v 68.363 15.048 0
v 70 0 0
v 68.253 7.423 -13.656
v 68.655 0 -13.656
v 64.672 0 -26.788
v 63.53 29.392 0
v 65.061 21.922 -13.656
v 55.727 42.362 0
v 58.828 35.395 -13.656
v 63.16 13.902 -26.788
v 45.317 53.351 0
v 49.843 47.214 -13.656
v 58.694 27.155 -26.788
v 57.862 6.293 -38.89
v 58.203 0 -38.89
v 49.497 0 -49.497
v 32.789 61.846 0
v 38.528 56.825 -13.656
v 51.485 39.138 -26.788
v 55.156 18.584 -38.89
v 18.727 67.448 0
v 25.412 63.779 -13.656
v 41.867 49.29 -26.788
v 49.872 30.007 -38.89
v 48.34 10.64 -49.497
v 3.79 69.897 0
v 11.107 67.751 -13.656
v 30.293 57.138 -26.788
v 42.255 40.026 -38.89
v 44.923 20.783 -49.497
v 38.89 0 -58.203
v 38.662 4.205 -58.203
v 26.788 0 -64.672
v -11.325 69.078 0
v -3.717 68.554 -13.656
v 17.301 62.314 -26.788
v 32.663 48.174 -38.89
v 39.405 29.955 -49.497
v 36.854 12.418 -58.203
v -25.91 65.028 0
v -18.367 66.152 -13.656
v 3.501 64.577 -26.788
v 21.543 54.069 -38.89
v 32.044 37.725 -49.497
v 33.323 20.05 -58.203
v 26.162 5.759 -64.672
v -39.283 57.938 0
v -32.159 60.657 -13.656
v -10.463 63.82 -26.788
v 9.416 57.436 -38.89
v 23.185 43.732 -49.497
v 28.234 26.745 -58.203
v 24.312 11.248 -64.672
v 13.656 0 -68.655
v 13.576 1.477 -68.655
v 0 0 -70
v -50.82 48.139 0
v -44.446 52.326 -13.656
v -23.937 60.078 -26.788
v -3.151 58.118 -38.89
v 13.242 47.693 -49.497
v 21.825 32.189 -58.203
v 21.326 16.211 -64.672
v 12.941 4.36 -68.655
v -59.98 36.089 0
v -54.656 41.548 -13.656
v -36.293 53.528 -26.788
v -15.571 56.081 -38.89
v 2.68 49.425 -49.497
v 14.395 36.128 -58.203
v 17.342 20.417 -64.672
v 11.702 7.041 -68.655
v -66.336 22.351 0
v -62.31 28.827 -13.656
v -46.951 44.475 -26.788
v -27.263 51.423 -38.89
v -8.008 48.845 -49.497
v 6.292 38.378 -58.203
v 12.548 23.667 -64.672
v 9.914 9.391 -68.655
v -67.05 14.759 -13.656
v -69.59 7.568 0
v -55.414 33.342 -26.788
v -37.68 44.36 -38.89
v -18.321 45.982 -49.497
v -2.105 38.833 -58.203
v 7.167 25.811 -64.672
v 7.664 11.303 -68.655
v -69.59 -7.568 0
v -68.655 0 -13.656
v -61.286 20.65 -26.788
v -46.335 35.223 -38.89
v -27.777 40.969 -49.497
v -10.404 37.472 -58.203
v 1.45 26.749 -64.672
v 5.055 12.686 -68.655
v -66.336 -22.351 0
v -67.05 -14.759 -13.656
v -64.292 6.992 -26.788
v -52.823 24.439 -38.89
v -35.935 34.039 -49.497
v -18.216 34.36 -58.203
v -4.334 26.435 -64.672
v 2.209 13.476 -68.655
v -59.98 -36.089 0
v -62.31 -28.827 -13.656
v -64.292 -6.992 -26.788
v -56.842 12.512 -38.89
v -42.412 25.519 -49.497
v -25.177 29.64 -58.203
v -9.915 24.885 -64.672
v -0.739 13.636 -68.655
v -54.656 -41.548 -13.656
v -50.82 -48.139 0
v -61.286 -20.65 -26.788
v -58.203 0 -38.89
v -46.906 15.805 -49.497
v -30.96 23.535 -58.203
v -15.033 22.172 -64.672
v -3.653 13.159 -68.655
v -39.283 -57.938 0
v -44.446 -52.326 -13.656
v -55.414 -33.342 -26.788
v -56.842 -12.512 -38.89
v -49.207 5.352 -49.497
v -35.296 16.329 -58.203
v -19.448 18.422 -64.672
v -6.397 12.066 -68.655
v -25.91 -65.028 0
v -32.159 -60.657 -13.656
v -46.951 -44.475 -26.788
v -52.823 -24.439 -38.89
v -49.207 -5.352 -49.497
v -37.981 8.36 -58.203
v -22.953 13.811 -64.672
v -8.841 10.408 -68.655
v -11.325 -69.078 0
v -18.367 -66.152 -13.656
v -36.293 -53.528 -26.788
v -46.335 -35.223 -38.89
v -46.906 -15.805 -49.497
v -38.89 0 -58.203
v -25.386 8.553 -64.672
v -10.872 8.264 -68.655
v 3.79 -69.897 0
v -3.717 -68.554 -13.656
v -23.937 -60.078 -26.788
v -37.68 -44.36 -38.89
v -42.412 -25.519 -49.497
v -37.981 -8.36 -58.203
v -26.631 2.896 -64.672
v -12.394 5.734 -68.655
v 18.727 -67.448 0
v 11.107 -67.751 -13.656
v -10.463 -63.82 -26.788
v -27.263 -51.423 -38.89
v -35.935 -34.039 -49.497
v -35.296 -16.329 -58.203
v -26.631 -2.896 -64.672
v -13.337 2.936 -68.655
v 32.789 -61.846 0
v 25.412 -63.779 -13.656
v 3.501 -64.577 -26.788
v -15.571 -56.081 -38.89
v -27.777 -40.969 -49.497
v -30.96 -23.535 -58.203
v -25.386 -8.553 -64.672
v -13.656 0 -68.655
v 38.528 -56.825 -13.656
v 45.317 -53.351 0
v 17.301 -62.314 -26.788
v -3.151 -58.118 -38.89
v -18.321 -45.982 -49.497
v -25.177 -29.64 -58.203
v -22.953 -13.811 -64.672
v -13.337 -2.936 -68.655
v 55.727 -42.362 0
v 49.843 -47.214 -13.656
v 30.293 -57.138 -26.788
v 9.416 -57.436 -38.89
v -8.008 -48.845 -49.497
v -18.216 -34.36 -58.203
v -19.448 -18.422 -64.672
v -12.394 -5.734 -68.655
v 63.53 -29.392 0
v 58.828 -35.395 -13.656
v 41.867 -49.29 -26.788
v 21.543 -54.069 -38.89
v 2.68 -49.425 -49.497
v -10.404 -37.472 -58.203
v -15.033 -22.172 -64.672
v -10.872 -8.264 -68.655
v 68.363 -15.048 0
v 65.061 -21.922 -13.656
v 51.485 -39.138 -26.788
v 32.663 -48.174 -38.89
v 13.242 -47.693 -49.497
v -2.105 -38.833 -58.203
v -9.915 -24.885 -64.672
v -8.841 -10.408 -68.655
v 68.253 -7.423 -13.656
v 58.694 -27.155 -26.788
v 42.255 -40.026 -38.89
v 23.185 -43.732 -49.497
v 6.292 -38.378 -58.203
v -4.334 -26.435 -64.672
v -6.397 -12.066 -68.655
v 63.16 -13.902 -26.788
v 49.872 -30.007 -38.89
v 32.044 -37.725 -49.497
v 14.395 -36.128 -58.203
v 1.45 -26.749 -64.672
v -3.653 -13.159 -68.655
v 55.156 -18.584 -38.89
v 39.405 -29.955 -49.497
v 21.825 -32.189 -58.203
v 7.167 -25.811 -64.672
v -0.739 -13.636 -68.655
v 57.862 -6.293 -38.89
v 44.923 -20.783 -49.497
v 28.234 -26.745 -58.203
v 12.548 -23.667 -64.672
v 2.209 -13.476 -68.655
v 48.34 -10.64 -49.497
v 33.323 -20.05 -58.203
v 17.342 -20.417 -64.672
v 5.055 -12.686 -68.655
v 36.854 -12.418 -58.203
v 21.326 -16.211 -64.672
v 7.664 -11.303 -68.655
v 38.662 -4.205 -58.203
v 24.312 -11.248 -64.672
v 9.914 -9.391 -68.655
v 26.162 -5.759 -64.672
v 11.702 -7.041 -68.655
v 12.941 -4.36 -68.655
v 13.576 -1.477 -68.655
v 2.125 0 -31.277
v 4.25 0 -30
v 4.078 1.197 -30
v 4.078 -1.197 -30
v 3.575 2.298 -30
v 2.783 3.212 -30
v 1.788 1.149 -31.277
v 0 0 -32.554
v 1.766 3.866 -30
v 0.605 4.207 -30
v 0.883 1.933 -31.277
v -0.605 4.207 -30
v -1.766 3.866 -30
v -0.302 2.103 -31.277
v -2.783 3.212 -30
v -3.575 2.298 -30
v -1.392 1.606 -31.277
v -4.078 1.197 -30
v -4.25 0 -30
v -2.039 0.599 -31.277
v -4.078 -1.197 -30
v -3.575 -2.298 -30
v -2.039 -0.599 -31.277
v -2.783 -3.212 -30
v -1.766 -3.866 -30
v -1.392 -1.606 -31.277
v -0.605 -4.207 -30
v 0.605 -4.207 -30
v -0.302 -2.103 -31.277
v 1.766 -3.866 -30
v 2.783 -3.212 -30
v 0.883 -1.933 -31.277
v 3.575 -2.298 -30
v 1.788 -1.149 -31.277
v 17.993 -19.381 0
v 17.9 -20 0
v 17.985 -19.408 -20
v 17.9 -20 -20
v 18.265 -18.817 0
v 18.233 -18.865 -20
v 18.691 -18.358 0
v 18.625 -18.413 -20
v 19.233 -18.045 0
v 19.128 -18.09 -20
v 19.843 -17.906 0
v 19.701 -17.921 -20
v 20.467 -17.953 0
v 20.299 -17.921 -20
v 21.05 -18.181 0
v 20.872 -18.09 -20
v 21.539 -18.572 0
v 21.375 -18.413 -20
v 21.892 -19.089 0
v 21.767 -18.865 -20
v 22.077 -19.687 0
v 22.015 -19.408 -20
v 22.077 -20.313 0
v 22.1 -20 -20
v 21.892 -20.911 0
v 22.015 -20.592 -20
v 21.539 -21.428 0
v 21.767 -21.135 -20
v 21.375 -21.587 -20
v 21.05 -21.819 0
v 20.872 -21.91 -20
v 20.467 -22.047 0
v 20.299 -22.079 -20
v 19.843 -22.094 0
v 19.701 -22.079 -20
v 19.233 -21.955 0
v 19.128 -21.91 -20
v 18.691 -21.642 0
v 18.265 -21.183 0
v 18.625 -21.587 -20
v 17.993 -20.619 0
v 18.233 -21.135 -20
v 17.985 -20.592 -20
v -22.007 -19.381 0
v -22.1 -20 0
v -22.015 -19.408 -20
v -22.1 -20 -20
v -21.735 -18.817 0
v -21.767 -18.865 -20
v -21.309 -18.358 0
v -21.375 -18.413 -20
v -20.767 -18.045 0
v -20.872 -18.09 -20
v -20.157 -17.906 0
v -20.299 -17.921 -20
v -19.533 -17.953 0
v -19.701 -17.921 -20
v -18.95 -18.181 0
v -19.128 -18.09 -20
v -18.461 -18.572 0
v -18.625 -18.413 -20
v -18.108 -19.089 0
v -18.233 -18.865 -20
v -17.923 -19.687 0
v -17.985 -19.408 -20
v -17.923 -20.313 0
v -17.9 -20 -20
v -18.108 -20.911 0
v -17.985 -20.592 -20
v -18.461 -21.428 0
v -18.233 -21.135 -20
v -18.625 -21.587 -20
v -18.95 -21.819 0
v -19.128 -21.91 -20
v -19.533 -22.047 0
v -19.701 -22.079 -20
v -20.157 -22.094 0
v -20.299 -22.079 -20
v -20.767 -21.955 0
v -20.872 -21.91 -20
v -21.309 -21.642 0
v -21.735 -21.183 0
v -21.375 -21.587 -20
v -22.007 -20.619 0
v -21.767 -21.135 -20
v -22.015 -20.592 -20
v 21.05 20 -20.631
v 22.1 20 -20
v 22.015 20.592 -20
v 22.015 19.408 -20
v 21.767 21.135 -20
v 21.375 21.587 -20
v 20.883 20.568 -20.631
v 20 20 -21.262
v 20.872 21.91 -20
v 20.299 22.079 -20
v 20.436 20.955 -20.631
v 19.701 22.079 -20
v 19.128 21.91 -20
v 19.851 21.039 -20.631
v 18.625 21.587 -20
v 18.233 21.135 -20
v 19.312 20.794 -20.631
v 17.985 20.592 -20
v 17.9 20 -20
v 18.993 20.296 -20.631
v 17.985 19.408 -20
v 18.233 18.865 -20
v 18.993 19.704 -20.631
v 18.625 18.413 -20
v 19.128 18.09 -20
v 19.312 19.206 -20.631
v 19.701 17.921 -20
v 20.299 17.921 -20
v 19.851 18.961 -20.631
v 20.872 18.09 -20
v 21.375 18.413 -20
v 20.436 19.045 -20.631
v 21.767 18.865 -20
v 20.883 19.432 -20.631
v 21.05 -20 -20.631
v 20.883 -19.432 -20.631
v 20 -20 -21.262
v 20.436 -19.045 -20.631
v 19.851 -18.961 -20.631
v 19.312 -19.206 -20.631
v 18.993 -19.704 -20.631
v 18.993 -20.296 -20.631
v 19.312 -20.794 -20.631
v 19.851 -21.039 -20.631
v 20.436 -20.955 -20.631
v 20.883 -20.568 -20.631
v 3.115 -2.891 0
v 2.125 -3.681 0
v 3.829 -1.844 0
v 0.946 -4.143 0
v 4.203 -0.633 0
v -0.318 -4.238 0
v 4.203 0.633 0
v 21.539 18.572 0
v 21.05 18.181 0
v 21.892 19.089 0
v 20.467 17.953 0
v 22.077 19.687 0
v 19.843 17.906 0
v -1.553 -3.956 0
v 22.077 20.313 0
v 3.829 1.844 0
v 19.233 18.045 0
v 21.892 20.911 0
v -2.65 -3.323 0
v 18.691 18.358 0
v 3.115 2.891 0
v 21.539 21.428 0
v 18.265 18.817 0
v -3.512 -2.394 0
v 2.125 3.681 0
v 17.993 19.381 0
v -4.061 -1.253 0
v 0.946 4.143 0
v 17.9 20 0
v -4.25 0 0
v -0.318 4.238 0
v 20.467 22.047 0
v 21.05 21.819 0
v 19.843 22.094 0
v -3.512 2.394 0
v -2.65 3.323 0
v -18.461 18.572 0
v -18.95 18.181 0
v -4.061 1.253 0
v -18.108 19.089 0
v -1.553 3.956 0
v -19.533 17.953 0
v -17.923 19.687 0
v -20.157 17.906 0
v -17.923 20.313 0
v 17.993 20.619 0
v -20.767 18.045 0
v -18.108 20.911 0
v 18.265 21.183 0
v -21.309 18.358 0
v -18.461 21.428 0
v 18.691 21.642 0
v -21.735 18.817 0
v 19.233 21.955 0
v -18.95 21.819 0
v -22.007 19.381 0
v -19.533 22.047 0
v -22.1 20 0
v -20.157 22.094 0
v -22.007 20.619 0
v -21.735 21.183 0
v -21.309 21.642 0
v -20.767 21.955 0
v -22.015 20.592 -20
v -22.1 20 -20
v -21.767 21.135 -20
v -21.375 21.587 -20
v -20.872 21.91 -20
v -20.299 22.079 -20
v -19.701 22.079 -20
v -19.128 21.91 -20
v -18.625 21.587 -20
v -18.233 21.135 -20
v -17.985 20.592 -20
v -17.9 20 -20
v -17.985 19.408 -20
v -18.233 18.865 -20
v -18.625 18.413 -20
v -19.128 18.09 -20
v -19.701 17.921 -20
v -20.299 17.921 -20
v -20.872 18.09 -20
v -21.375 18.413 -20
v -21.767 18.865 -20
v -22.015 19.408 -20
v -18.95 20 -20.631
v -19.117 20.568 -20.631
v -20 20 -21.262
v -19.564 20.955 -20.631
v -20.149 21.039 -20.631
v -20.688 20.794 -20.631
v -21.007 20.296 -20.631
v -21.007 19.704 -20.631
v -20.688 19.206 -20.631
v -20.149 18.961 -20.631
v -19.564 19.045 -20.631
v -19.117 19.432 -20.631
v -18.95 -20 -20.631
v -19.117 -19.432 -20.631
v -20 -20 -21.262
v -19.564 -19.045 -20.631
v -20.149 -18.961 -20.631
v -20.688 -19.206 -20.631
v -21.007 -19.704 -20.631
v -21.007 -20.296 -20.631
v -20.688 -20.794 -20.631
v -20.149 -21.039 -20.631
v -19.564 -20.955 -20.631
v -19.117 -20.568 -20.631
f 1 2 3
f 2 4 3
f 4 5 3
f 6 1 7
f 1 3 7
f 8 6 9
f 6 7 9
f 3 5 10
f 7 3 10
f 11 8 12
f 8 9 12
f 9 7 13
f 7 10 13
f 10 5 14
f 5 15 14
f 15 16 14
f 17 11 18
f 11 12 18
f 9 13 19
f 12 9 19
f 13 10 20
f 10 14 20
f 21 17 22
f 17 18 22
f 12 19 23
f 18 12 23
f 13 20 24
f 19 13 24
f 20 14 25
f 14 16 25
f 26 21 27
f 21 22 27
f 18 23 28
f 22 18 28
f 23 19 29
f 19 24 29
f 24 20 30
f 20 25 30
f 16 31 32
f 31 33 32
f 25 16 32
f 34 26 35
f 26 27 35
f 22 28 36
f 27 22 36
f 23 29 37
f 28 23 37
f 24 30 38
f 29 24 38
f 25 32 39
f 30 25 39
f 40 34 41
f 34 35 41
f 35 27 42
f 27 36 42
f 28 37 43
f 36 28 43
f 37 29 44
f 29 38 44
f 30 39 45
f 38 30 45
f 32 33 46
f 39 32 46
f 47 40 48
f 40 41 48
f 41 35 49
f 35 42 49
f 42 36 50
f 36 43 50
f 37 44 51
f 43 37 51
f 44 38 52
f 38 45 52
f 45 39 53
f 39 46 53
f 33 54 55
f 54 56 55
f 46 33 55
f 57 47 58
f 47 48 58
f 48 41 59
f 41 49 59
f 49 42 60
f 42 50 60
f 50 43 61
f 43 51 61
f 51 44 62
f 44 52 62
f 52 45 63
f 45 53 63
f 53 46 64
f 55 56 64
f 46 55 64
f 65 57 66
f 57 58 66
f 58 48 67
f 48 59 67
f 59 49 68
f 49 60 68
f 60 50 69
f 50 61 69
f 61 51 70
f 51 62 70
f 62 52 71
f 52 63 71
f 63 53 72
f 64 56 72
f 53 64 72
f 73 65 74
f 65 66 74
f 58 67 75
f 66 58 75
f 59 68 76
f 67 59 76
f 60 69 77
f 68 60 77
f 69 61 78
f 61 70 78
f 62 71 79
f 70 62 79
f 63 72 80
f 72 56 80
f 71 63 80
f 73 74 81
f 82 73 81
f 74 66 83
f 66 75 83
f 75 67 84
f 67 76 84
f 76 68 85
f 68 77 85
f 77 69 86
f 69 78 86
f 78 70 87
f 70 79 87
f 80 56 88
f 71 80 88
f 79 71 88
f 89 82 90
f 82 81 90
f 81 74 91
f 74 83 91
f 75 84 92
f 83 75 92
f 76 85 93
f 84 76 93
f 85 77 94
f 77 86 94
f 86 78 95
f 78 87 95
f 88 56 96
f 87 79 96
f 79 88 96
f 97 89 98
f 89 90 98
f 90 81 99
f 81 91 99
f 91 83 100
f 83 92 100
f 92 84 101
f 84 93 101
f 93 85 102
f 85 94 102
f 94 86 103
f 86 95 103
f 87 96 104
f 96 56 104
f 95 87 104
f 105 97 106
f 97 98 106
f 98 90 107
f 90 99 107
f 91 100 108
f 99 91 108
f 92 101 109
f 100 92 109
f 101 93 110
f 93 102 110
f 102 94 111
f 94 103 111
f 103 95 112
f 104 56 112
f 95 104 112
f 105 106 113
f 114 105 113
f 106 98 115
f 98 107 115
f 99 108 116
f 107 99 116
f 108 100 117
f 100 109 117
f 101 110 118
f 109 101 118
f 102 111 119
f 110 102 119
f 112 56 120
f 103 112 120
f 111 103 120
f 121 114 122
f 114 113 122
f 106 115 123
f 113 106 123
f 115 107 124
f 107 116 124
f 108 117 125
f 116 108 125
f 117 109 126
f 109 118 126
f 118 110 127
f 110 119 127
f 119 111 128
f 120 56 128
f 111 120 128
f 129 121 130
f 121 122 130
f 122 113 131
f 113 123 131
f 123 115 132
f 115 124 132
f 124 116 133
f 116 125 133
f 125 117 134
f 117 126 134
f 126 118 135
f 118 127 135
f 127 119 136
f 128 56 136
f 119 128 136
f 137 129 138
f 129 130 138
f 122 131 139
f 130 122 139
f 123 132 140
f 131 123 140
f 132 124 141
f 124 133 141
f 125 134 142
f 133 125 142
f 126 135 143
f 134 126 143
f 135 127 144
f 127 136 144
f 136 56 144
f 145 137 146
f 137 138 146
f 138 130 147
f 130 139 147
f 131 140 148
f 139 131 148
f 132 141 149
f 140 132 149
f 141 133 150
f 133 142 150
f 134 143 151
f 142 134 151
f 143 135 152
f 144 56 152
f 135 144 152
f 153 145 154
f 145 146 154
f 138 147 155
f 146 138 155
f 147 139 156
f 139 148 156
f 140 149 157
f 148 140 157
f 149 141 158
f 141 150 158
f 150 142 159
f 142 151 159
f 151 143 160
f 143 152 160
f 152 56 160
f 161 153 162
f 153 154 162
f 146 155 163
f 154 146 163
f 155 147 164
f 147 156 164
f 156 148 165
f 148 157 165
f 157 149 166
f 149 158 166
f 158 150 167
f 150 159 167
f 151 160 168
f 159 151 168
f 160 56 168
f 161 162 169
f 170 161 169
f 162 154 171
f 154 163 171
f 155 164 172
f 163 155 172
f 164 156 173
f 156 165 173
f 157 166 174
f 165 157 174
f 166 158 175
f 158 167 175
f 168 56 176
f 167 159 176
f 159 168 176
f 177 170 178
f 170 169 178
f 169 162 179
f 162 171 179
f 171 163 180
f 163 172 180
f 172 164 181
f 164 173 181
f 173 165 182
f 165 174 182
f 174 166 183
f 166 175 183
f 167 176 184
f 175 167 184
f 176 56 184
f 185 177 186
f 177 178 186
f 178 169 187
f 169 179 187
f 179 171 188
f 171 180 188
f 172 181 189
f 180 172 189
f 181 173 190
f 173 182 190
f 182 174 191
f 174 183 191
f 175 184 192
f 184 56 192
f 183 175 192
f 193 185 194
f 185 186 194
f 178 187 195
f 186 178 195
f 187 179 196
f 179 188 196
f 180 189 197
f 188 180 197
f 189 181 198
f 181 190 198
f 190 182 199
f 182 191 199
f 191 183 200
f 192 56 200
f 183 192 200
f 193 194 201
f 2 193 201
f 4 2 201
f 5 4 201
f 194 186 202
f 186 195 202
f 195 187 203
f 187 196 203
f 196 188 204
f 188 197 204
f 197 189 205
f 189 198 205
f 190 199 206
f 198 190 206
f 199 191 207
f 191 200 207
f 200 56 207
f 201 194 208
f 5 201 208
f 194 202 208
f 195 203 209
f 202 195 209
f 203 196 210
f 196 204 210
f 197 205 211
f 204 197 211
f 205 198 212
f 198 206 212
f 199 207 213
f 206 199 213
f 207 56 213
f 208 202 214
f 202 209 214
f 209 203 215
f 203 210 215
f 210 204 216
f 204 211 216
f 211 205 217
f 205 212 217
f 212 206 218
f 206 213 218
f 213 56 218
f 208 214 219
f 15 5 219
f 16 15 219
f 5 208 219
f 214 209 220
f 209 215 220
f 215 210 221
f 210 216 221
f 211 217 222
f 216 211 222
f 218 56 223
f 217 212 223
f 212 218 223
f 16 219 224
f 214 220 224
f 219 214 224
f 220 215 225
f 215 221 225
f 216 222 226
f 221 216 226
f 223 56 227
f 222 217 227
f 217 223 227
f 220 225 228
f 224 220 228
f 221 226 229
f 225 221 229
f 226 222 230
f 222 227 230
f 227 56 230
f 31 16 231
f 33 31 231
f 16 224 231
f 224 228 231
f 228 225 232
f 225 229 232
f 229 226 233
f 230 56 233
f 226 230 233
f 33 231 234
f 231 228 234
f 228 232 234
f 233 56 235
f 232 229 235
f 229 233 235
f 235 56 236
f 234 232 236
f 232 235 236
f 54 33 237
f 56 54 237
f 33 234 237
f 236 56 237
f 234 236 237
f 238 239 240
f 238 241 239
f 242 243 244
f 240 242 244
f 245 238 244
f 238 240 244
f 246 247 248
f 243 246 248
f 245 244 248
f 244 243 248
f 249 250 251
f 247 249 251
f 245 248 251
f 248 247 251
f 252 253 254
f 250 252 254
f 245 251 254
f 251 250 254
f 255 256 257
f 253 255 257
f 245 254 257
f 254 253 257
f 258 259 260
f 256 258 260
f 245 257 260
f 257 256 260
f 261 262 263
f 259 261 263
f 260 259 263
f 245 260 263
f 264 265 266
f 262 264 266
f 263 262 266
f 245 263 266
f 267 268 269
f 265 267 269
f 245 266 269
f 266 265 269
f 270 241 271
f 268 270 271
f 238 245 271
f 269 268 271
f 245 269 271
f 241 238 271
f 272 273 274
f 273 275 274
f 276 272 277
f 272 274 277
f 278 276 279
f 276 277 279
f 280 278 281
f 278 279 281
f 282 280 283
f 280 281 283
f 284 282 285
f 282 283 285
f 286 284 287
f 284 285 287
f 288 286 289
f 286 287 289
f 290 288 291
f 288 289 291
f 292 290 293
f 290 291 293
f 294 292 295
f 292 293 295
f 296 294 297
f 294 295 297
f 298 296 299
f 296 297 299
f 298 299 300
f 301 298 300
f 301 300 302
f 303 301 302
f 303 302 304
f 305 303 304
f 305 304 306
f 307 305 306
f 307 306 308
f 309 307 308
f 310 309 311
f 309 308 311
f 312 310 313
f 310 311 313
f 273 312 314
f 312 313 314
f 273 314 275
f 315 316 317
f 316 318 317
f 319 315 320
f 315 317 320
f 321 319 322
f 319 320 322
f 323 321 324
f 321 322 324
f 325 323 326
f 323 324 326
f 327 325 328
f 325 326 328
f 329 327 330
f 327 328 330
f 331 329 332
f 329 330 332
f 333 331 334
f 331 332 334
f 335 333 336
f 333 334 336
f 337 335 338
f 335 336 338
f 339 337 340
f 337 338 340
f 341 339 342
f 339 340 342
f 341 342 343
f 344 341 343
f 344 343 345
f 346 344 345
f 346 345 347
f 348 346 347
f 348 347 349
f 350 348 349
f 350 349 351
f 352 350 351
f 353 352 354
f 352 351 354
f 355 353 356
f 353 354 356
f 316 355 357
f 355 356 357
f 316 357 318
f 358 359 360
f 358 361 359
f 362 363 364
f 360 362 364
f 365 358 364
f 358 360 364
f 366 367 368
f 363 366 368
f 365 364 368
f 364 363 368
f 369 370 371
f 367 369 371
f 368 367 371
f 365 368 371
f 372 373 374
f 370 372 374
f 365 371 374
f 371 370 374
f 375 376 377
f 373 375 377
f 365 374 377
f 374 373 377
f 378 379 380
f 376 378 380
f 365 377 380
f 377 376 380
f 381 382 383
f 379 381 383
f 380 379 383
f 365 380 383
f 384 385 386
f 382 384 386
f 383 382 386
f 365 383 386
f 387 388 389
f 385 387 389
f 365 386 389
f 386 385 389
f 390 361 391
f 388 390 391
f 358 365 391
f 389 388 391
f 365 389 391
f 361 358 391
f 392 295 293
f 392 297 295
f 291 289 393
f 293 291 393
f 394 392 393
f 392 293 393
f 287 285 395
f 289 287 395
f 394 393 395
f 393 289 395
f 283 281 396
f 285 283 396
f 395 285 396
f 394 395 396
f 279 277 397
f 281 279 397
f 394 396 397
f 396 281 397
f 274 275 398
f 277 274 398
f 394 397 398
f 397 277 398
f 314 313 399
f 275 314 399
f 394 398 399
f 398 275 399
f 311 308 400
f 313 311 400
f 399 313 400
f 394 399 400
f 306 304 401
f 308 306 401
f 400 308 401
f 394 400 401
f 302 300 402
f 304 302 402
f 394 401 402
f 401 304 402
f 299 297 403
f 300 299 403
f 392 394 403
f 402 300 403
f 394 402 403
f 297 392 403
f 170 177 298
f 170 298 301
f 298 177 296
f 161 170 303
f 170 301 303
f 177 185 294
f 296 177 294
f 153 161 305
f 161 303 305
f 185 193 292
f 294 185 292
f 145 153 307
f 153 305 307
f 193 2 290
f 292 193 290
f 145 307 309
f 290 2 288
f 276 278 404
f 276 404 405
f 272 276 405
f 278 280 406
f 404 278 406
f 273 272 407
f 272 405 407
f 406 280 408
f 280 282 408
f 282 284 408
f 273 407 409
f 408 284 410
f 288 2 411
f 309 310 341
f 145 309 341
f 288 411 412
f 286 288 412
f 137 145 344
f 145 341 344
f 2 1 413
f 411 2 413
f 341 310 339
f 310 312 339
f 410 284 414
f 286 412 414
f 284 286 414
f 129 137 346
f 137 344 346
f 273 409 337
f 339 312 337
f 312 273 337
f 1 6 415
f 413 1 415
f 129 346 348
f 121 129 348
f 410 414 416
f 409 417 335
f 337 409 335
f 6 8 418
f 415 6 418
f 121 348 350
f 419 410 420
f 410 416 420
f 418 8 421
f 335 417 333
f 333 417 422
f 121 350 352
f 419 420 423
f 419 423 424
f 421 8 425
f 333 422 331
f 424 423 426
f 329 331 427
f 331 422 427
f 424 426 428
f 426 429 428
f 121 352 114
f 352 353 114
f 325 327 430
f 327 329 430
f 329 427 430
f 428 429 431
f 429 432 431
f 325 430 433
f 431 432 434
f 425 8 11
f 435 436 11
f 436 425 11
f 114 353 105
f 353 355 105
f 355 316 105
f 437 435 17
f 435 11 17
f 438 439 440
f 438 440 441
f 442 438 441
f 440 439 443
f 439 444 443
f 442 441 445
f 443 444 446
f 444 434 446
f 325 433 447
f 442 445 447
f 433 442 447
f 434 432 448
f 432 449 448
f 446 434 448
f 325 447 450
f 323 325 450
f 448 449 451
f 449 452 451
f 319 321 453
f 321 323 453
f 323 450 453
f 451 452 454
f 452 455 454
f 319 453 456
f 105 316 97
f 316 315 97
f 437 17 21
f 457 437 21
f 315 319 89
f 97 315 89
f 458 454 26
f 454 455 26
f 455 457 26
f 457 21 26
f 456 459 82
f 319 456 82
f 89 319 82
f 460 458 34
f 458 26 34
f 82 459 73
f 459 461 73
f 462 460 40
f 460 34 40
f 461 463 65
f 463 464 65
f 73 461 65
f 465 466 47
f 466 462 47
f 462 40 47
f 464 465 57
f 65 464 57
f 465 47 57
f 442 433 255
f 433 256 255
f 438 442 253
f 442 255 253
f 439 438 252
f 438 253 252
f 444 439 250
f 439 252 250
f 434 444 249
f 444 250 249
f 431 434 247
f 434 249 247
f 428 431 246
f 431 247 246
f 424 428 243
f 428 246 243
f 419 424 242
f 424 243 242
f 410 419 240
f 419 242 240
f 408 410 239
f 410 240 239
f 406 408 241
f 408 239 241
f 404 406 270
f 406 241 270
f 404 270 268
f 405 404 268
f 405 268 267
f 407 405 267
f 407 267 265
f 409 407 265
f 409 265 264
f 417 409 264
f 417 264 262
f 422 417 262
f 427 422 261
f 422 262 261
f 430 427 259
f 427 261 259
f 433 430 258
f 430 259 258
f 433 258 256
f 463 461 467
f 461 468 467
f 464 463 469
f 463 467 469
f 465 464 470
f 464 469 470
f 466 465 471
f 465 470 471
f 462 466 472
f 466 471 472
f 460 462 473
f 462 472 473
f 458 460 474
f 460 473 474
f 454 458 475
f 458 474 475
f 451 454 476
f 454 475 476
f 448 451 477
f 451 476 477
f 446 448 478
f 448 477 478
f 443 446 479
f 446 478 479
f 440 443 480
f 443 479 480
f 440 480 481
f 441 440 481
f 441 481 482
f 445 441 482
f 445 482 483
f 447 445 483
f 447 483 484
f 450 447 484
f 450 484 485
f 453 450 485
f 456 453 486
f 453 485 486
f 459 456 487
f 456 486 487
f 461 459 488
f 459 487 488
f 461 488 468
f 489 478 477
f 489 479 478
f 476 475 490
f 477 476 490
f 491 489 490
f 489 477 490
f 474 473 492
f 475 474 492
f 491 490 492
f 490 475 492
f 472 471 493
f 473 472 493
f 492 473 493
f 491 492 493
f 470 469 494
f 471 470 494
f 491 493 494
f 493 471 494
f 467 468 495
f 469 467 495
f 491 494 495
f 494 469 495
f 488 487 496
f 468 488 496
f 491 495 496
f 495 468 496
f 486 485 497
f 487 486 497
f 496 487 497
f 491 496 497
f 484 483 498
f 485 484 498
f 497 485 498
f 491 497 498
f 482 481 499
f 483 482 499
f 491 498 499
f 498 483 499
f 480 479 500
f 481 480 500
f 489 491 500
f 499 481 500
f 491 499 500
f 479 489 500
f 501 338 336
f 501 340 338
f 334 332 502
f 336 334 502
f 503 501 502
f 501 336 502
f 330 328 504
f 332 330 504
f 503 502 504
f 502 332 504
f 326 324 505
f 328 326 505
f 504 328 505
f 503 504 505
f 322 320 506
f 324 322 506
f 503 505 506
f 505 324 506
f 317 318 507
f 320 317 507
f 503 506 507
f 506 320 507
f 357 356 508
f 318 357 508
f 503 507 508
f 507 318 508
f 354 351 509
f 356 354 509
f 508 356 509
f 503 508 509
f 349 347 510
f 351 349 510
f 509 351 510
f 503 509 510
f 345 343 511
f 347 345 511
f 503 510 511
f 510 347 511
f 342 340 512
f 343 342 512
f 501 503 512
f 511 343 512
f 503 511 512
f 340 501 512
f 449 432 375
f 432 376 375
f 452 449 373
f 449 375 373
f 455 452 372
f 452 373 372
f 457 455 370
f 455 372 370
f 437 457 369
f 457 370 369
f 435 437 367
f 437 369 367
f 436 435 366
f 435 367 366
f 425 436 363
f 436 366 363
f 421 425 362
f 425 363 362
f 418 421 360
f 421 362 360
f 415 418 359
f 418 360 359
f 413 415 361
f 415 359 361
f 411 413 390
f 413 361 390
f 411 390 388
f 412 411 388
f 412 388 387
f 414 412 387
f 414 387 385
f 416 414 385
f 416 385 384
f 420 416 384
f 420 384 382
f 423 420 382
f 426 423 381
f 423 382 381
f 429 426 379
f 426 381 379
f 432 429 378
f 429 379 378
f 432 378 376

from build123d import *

# Parameters (mm, degrees)
M10_TAPPED_HOLE1_D     = 8.5
M10_TAPPED_HOLE1_DEPTH = 30
M10_TAPPED_HOLE1_TIP   = 2.553657631
M5_TAPPED_HOLE1_D      = 4.2
M5_TAPPED_HOLE1_DEPTH  = 20
M5_TAPPED_HOLE1_TIP    = 1.2618073


with BuildPart() as part:
    # Sketch2 → Revolve1 (revolve)
    with BuildSketch(Plane(origin=(0, 0, 0), x_dir=(1, 0, 0), z_dir=(0, 1, 0))):
        with BuildLine():
            Line((0, 70), (0, 0))
            Line((0, 0), (70, 0))
            ThreePointArc((70, 0), (49.497474683, 49.497474683), (0, 70))
        make_face()
    revolve(axis=Axis((0, 0, -70), (0, 0, 1)))

    # M10 Tapped Hole1
    with Locations(Plane.XY):
        with Locations((0, 0)):
            Hole(M10_TAPPED_HOLE1_D / 2, depth=M10_TAPPED_HOLE1_DEPTH)
            with Locations((0, 0, -(M10_TAPPED_HOLE1_DEPTH + M10_TAPPED_HOLE1_TIP / 2))):  # 118° drill point
                Cone(0, M10_TAPPED_HOLE1_D / 2, M10_TAPPED_HOLE1_TIP, mode=Mode.SUBTRACT)

    # M5 Tapped Hole1
    with Locations(Plane.XY):
        with Locations((-20, 20), (20, 20), (20, -20), (-20, -20)):
            Hole(M5_TAPPED_HOLE1_D / 2, depth=M5_TAPPED_HOLE1_DEPTH)
            with Locations((0, 0, -(M5_TAPPED_HOLE1_DEPTH + M5_TAPPED_HOLE1_TIP / 2))):  # 118° drill point
                Cone(0, M5_TAPPED_HOLE1_D / 2, M5_TAPPED_HOLE1_TIP, mode=Mode.SUBTRACT)


solid = part.part
